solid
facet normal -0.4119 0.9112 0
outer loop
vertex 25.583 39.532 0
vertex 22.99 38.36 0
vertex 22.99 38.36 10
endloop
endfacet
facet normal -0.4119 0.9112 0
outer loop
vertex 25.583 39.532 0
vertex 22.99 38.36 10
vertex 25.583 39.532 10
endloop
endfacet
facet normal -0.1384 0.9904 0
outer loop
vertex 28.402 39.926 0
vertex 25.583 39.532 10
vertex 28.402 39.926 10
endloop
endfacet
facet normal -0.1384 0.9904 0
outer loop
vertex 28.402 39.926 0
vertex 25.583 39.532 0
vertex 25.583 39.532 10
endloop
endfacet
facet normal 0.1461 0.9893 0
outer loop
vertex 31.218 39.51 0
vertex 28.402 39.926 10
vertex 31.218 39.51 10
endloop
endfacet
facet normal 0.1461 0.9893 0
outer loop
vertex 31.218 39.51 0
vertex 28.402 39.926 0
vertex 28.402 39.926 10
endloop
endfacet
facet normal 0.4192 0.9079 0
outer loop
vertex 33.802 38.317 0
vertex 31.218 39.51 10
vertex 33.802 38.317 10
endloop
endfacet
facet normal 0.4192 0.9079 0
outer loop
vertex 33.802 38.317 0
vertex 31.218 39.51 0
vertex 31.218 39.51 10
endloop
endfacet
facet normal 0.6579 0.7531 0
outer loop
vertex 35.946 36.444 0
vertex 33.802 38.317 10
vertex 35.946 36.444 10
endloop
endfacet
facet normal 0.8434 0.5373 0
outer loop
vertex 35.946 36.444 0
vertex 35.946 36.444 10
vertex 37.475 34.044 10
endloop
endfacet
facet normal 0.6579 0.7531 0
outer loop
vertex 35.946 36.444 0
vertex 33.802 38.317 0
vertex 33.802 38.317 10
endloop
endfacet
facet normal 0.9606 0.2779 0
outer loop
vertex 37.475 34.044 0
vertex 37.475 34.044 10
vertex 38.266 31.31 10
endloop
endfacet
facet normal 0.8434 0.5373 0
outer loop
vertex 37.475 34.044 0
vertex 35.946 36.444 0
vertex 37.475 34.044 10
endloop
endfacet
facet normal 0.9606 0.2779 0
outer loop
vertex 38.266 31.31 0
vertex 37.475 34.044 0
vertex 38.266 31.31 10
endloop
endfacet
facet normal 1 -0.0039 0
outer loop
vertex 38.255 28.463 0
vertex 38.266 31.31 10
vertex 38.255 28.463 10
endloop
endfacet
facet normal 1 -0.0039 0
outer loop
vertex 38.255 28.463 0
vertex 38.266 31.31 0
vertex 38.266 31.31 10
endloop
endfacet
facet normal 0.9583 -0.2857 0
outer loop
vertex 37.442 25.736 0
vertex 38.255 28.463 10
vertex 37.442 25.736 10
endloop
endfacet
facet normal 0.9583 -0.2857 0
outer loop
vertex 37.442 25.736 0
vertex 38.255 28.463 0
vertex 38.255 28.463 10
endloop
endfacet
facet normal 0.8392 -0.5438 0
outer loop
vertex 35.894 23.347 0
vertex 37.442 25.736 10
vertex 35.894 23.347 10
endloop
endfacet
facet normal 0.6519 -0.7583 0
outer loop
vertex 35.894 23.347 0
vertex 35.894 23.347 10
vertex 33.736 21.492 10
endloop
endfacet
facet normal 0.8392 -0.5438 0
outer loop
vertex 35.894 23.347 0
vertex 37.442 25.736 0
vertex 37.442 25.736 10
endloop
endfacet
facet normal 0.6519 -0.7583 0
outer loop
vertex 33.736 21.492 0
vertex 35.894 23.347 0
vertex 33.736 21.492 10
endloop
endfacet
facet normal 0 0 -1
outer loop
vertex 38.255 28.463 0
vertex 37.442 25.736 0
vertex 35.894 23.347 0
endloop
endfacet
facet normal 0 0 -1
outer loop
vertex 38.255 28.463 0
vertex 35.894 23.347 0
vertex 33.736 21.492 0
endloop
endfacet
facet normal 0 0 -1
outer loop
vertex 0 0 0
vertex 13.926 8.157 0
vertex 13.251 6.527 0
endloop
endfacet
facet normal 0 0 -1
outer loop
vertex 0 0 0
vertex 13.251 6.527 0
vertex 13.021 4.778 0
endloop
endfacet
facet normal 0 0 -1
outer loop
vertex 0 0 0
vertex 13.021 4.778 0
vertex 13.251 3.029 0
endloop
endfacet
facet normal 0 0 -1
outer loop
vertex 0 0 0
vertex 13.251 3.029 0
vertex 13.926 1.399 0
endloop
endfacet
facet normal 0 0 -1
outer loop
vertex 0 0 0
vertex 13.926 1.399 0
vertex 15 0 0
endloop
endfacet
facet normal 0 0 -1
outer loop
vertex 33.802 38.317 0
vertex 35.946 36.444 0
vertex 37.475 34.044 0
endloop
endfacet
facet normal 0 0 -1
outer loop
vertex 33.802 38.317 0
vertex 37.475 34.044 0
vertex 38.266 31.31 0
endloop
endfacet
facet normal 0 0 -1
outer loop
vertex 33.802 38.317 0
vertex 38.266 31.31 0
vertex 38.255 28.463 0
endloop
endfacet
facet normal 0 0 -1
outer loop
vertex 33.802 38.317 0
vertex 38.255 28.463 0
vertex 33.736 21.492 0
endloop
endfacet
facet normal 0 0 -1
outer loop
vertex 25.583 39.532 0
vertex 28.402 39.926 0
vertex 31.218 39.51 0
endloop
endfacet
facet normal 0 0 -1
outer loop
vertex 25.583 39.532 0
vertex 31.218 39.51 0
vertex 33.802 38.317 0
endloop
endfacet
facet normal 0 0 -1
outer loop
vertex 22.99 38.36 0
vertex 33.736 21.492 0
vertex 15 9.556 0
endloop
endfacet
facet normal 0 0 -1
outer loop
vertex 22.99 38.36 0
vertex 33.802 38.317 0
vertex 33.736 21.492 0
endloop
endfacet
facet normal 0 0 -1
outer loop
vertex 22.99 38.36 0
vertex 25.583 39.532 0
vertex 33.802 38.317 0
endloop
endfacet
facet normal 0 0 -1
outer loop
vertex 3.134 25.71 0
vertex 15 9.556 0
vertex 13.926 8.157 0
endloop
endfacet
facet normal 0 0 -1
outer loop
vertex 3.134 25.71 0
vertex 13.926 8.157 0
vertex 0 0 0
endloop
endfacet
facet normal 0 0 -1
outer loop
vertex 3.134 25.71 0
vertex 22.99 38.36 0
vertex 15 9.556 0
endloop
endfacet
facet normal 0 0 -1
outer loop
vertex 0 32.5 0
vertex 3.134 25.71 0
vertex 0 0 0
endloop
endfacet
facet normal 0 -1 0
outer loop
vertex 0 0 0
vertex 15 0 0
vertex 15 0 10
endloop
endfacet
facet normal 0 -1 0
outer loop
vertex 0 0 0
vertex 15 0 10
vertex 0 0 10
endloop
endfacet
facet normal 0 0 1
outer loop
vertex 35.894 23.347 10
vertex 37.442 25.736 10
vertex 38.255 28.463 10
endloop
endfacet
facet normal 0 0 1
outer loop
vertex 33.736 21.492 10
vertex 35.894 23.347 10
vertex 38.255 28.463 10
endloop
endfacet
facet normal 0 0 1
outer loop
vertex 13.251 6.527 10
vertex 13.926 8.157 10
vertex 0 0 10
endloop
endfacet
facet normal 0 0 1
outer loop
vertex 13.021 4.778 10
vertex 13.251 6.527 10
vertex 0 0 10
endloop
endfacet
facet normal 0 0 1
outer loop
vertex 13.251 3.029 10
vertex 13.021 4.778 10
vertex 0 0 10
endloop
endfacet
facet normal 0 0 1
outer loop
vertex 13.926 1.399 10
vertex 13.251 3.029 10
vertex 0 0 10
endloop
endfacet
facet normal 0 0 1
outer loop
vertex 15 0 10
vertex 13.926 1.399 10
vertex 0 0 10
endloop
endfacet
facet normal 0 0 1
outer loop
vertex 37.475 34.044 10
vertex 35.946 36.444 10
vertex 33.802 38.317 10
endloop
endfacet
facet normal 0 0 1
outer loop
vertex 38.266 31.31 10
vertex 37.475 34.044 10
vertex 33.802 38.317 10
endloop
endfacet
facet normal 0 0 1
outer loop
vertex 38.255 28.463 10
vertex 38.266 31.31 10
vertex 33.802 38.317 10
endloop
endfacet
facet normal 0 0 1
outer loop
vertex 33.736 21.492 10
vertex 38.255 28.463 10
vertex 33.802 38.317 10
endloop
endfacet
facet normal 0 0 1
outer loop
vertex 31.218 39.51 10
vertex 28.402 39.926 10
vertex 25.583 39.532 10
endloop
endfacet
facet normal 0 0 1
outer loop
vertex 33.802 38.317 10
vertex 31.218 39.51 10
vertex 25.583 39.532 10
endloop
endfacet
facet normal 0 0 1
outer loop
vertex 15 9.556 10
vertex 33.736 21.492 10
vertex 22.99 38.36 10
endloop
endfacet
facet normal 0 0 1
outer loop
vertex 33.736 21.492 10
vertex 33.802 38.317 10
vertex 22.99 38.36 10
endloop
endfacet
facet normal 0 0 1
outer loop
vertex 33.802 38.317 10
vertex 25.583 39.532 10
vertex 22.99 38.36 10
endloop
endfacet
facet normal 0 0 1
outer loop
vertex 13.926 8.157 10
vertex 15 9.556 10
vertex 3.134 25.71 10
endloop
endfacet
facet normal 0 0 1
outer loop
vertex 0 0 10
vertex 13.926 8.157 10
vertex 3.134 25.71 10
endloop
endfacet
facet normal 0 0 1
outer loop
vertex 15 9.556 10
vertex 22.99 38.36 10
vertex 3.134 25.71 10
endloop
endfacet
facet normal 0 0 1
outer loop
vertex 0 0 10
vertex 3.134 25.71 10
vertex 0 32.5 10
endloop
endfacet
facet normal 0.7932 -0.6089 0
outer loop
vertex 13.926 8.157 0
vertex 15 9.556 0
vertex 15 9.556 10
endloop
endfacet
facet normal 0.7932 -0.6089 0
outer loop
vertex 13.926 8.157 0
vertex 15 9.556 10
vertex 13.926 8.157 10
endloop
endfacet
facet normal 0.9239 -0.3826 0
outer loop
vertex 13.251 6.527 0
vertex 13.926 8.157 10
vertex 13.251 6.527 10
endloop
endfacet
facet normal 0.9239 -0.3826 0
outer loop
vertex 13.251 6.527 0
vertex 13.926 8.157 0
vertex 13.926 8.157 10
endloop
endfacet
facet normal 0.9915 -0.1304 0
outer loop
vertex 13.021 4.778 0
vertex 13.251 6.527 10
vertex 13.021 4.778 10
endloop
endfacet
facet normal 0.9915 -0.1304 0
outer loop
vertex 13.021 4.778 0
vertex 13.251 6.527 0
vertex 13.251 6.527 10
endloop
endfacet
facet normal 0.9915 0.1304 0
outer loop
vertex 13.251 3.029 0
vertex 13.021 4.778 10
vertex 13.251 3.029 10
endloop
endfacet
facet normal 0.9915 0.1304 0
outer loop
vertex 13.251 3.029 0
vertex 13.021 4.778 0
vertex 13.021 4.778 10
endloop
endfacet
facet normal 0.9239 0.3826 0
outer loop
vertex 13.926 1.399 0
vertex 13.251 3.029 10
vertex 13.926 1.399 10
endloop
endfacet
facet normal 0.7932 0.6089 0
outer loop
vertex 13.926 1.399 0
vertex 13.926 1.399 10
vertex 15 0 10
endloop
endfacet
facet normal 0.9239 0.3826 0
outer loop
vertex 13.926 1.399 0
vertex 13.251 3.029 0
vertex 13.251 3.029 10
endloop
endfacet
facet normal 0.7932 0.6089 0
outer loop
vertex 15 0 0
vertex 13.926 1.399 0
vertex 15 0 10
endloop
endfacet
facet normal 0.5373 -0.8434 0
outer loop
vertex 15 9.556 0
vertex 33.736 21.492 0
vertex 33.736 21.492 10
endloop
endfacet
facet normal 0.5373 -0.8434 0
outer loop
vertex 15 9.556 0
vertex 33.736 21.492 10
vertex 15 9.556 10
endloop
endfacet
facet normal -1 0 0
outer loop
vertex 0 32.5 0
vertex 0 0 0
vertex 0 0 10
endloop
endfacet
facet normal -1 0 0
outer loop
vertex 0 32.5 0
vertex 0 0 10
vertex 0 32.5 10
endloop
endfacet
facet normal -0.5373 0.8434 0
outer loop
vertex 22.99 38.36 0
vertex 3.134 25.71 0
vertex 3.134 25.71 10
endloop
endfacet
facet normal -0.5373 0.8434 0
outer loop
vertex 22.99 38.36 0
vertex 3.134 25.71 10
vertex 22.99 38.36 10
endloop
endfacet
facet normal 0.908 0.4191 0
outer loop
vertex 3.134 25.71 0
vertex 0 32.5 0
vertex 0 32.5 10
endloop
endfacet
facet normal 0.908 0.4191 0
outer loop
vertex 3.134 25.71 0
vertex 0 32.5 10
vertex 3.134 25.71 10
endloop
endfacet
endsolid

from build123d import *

# Parameters (mm, degrees)
BOSS_EXTRUDE1_DEPTH = 10


with BuildPart() as part:
    # Sketch1 → Boss-Extrude1 (new body)
    with BuildSketch(Plane.XY):
        with BuildLine():
            Line((0, 0), (0, 32.5))
            Line((0, 32.5), (3.133753016, 25.7102018))
            Line((3.133753016, 25.7102018), (22.989665666, 38.35981325))
            ThreePointArc((22.989665666, 38.35981325), (36.796576207, 35.298894875), (33.735657833, 21.491984334))
            Line((33.735657833, 21.491984334), (15, 9.556053912))
            ThreePointArc((15, 9.556053912), (13.020876433, 4.778026956), (15, 0))
            Line((15, 0), (0, 0))
        make_face()
    extrude(amount=BOSS_EXTRUDE1_DEPTH)


solid = part.part
